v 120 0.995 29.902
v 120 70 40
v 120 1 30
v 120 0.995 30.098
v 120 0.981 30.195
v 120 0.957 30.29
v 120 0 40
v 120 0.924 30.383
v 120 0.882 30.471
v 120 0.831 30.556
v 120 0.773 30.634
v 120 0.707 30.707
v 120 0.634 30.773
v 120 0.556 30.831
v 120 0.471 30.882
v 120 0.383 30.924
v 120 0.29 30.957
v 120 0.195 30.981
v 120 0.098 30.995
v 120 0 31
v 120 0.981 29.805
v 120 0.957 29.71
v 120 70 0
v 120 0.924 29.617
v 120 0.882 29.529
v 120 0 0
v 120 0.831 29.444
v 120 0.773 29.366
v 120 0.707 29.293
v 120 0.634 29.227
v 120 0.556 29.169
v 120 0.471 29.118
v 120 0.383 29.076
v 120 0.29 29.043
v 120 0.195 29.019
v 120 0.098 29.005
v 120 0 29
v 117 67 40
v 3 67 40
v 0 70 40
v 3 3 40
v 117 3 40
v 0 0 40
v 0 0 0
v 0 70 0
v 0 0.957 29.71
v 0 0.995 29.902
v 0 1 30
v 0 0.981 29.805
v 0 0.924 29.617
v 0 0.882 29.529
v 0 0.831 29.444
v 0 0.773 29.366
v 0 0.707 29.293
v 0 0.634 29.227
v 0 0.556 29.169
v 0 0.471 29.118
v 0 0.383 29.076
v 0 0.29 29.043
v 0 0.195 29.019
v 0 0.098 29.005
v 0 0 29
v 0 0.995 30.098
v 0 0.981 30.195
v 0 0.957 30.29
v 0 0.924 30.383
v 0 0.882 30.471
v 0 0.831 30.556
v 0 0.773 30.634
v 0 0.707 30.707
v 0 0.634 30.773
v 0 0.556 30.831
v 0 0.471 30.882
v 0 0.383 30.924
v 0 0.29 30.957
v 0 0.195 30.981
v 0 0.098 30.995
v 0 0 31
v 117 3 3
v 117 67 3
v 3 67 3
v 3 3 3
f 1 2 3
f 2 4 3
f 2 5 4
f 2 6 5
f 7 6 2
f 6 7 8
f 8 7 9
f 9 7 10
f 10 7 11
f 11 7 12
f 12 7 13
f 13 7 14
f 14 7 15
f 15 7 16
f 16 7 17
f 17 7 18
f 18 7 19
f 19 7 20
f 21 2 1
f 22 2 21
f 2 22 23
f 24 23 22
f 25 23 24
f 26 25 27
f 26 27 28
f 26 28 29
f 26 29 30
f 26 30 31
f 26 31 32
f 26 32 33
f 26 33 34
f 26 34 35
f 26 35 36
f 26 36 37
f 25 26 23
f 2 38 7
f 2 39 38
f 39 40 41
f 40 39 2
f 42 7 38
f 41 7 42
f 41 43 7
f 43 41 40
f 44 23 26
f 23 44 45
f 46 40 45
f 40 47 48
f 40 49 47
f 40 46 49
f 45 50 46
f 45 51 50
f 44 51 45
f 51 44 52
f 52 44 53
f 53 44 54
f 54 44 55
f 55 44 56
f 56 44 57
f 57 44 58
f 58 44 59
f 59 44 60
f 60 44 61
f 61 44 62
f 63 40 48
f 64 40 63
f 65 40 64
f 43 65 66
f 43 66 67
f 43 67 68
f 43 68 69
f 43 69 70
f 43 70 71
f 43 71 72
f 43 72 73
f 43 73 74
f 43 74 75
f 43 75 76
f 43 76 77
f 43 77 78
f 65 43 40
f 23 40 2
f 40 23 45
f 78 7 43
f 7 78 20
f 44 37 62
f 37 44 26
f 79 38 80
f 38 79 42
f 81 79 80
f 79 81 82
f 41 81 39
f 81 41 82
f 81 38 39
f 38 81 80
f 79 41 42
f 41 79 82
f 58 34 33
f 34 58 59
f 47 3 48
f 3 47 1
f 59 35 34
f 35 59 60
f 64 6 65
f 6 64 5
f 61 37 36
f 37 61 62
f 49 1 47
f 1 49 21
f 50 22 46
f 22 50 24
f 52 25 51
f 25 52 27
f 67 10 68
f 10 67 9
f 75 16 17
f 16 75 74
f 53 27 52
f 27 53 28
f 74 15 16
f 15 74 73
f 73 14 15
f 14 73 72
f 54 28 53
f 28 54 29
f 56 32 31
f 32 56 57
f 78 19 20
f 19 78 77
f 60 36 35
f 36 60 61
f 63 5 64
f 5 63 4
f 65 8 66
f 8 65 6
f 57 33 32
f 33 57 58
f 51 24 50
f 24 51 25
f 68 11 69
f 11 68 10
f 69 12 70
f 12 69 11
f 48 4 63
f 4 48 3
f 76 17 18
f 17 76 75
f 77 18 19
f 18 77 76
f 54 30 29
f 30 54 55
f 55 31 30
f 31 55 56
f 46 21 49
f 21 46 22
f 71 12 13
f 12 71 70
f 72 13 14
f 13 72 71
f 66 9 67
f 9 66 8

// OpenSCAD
// Buffer tank for mini horizontal gel-electrophoresis box
outer_X = 120;          // Outer length (X)
outer_Y = 70;           // Outer width (Y)
outer_Z = 40;           // Outer height (Z)
wall_thick = 3;         // Wall thickness
floor_thick = 3;        // Floor thickness
platform_X = 60;        // Platform length in X
platform_top_z = 13;    // Platform top Z position
platform_thick = 2;     // Platform thickness
hole_dia = 2;           // Electrode wire hole diameter
hole_z = 30;            // Electrode wire hole Z position

inner_X = outer_X - 2 * wall_thick;
inner_Y = outer_Y - 2 * wall_thick;
inner_Z = outer_Z - floor_thick;
platform_Y = inner_Y;

// Platform position (centered in X, spans full inner width in Y)
platform_start_x = (inner_X - platform_X) / 2;
platform_start_y = wall_thick;
platform_start_z = platform_top_z - platform_thick;

difference() {
    // Outer shape (bottom at z = 0)
    cube([outer_X, outer_Y, outer_Z], [0, 0, 0]);
    
    // Inner cavity (bottom at z = floor_thick)
    translate([wall_thick, wall_thick, floor_thick]) {
        cube([inner_X, inner_Y, inner_Z]);
    }
    
    // Platform
    translate([platform_start_x, platform_start_y, platform_start_z]) {
        cube([platform_X, platform_Y, platform_thick]);
    }
    
    // Electrode wire holes (along X-axis, through end walls)
    translate([0, 0, hole_z]) {
        rotate([0, 90, 0]) {
            cylinder(d = hole_dia, h = outer_X + 1, $fn = 64);
        }
    }
}
